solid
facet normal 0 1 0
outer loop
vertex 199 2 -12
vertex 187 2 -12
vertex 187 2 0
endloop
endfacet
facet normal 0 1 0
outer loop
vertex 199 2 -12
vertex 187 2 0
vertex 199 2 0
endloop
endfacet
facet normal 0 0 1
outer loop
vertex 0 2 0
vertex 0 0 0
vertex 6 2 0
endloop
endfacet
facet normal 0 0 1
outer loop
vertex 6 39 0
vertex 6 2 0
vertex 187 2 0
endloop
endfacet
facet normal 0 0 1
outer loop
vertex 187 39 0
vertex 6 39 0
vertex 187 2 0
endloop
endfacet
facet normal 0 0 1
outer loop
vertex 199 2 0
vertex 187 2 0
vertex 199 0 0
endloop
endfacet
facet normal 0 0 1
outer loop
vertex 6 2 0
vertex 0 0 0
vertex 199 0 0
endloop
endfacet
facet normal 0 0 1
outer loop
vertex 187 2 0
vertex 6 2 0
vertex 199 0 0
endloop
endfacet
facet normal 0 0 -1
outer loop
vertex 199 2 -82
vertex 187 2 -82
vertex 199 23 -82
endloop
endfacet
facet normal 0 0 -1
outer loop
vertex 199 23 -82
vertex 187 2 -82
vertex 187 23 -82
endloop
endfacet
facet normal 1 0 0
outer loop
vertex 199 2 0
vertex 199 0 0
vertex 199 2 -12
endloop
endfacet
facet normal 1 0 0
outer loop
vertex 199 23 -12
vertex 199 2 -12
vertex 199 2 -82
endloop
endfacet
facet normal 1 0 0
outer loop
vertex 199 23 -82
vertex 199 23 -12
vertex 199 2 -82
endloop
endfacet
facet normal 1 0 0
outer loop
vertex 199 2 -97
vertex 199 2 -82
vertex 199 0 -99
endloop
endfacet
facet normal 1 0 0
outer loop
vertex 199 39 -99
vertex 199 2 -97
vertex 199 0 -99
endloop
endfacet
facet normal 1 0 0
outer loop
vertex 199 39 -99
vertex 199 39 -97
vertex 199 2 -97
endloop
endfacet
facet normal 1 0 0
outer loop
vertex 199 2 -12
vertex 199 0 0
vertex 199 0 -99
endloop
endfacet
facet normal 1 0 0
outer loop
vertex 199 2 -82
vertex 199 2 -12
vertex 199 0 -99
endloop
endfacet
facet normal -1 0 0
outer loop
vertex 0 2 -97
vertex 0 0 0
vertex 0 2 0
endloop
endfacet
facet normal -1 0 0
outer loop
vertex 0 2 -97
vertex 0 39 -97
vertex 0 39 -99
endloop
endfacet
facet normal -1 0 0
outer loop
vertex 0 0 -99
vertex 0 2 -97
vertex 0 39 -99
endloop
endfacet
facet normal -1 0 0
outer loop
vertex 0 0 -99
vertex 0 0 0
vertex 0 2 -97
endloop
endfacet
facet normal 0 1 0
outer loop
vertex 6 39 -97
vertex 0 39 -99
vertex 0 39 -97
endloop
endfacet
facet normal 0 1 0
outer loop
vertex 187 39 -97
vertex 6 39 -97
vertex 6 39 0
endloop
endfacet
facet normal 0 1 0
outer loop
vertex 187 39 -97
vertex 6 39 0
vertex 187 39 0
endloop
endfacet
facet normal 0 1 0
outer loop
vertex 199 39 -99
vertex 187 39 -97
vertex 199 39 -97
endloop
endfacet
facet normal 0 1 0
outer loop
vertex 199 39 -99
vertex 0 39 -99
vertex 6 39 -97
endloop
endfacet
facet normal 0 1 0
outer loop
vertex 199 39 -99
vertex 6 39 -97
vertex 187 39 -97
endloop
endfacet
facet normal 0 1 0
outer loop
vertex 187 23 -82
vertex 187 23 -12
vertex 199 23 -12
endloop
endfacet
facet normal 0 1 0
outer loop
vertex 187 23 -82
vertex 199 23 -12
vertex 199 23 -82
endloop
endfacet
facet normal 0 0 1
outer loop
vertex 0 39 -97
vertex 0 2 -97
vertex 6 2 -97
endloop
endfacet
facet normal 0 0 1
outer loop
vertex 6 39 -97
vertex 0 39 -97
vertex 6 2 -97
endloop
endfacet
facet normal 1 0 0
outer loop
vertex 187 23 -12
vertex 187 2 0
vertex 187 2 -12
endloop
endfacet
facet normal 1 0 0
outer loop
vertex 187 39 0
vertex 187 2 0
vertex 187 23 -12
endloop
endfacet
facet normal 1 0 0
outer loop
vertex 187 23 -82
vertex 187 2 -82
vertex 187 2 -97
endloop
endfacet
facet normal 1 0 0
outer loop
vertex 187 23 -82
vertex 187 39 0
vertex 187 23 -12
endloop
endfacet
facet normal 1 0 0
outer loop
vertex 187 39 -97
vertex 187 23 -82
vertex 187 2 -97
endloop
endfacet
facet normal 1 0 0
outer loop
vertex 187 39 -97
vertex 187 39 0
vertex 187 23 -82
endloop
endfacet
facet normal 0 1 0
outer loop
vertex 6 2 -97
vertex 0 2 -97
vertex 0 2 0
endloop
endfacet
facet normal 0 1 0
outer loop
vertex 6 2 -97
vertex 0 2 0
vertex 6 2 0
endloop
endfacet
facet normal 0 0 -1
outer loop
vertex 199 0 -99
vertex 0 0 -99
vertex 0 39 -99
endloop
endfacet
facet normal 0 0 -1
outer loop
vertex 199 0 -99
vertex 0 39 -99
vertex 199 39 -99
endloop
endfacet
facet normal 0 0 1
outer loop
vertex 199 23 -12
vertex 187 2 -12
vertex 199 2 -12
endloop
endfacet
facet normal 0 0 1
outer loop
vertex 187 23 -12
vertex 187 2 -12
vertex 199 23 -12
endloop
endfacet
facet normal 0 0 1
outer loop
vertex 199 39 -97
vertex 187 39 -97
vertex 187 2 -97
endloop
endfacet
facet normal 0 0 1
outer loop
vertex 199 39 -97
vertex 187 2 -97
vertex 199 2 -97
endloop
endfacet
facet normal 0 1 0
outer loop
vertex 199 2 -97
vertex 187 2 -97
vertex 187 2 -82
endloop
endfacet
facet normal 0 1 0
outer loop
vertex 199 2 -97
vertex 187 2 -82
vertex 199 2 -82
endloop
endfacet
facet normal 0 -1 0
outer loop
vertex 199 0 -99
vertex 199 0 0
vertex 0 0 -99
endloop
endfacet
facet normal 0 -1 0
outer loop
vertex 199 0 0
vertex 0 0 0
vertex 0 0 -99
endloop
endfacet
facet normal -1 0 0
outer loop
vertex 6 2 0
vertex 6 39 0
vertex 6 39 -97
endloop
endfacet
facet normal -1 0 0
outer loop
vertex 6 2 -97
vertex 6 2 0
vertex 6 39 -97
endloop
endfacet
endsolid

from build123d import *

# Parameters (mm, degrees)
SKETCH_1_W          = 199
SKETCH_1_H          = 99
EXTRUDE_1_DEPTH     = 39
SKETCH_2_W          = 6
SKETCH_2_H          = 97
SKETCH_2_W_2        = 12
CUT_EXTRUDE_1_DEPTH = 37
SKETCH_3_W          = 70
SKETCH_3_H          = 23
EXTRUDE_2_DEPTH     = 12


with BuildPart() as part:
    # Эскиз1 → Бобышка-Вытянуть1 (new body)
    with BuildSketch(Plane(origin=(0, 0, 0), x_dir=(1, 0, 0), z_dir=(0, 1, 0))):
        with Locations((99.5, 49.5)):
            Rectangle(SKETCH_1_W, SKETCH_1_H)
    extrude(amount=EXTRUDE_1_DEPTH)

    # Эскиз2 → Вырез-Вытянуть1 (cut)
    with BuildSketch(Plane(origin=(0, 39, 0), x_dir=(1, 0, 0), z_dir=(0, 1, 0))):
        with Locations((3, 48.5)):
            Rectangle(SKETCH_2_W, SKETCH_2_H)
        with Locations((193, 48.5)):
            Rectangle(SKETCH_2_W_2, SKETCH_2_H)
    extrude(amount=-CUT_EXTRUDE_1_DEPTH, mode=Mode.SUBTRACT)

    # Эскиз3 → Бобышка-Вытянуть2 (add)
    with BuildSketch(Plane(origin=(187, 0, 0), x_dir=(0, 0, -1), z_dir=(1, 0, 0))):
        with Locations((47, 11.5)):
            Rectangle(SKETCH_3_W, SKETCH_3_H)
    extrude(amount=EXTRUDE_2_DEPTH)


solid = part.part
